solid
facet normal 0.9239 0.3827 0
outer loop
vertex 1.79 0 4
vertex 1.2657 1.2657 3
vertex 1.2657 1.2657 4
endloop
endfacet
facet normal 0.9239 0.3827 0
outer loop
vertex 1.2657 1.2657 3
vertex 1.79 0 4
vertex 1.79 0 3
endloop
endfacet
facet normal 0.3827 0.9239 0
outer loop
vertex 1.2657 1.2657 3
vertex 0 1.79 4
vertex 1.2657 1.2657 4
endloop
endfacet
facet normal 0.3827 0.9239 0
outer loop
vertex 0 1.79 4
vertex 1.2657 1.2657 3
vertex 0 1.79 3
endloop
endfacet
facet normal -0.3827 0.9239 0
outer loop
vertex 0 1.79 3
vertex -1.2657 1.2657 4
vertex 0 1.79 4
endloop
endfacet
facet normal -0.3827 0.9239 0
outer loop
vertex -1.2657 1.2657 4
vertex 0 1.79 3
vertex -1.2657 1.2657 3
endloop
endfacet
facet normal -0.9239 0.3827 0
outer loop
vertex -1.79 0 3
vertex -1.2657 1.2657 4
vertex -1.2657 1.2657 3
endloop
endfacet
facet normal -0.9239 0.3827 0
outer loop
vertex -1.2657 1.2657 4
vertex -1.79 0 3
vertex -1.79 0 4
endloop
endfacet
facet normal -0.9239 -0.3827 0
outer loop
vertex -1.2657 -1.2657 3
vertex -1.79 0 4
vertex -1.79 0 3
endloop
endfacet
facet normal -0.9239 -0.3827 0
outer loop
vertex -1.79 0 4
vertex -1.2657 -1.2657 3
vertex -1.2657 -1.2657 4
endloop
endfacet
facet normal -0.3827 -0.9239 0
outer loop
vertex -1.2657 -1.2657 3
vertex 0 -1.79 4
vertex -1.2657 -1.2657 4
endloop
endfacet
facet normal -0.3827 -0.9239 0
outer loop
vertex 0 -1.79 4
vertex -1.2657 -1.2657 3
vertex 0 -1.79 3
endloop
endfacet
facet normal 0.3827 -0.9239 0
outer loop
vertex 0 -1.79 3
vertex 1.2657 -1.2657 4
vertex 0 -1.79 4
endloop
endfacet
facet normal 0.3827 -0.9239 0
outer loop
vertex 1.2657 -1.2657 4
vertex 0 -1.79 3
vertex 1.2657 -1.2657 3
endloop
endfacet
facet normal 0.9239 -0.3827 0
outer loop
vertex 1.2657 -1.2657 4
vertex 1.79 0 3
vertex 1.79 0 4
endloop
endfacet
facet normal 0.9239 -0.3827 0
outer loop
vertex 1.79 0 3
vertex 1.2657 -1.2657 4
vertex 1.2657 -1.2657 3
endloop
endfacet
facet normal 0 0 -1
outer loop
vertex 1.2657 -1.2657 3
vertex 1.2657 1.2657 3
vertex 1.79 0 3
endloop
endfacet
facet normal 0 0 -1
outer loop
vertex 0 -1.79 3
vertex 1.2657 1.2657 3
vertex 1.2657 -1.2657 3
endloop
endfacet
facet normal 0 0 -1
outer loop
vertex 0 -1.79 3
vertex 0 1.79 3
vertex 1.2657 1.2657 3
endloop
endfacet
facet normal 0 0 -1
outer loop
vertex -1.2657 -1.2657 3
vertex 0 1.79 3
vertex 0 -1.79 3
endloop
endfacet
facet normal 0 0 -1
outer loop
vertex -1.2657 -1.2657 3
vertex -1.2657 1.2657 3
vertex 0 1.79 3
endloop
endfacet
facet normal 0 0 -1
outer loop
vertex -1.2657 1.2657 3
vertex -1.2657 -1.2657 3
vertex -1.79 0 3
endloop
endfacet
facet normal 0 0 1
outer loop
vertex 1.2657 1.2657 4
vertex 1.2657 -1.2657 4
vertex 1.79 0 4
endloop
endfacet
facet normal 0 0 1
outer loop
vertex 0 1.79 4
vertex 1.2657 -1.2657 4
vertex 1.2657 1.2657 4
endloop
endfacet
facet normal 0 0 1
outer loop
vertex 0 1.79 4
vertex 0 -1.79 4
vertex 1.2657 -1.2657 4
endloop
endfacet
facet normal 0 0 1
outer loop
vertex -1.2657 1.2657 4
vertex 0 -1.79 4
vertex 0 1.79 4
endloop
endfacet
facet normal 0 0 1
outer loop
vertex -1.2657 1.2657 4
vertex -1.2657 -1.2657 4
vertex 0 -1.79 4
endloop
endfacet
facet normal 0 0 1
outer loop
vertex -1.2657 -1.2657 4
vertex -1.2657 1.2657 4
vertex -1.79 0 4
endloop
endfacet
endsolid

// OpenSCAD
use <lib.scad>

hd = 72;
ld = 16;
vld = 8;

module frameHD($fn=hd) {
	translate([0,0,1.5]) difference() {
		fillet(0.01,$fn=8) union() {
			box([4.8,4.8,3]);
			translate([0,0,0.75]) cyl(2,2,3,$fn=hd);
			translate([2.23,2.23,0]) box([0.5,0.5,3]);
			translate([2.23,-2.23,0]) box([0.5,0.5,3]);
			translate([-2.23,2.23,0]) box([0.5,0.5,3]);
			translate([-2.23,-2.23,0]) box([0.5,0.5,3]);
		}
		box([6,3,1]);
		box([3,6,1]);
		translate([0,0,1.5]) cyl(1.8,1.8,3);
	}
}

module frameLD($fn=ld) {
	translate([0,0,1.5]) difference() {
		union() {
			box([4.8,4.8,3]);
			translate([0,0,0.75]) cyl(2,2,3);
		}
		box([6,3,1]);
		box([3,6,1]);
		translate([0,0,1.5]) cyl(1.8,1.8,3);
	}
}

module frameVLD($fn=vld) {
	translate([0,0,1.5]) difference() {
		union() {
			box([4.8,4.8,3]);
			translate([0,0,0.75]) cyl(2,2,3);
		}
	}
}

module rotor() {
	translate([0,0,3.5]) difference() {
		cyl(1.79,1.79,1);
		if ($fn > 8) {
			for (i = [0:1:12]) translate([0,0,1]) rotate([0,0,i*30]) translate([0,1,0]) rotate([-10,0,0]) box([0.3,2,1]);
		}
	}
}

module side() {
	translate([0,-2,1.5]) box([2.99,1,0.99]);
}

//frameHD();
//frameVLD();
rotor($fn=vld);
//side($fn=d);
